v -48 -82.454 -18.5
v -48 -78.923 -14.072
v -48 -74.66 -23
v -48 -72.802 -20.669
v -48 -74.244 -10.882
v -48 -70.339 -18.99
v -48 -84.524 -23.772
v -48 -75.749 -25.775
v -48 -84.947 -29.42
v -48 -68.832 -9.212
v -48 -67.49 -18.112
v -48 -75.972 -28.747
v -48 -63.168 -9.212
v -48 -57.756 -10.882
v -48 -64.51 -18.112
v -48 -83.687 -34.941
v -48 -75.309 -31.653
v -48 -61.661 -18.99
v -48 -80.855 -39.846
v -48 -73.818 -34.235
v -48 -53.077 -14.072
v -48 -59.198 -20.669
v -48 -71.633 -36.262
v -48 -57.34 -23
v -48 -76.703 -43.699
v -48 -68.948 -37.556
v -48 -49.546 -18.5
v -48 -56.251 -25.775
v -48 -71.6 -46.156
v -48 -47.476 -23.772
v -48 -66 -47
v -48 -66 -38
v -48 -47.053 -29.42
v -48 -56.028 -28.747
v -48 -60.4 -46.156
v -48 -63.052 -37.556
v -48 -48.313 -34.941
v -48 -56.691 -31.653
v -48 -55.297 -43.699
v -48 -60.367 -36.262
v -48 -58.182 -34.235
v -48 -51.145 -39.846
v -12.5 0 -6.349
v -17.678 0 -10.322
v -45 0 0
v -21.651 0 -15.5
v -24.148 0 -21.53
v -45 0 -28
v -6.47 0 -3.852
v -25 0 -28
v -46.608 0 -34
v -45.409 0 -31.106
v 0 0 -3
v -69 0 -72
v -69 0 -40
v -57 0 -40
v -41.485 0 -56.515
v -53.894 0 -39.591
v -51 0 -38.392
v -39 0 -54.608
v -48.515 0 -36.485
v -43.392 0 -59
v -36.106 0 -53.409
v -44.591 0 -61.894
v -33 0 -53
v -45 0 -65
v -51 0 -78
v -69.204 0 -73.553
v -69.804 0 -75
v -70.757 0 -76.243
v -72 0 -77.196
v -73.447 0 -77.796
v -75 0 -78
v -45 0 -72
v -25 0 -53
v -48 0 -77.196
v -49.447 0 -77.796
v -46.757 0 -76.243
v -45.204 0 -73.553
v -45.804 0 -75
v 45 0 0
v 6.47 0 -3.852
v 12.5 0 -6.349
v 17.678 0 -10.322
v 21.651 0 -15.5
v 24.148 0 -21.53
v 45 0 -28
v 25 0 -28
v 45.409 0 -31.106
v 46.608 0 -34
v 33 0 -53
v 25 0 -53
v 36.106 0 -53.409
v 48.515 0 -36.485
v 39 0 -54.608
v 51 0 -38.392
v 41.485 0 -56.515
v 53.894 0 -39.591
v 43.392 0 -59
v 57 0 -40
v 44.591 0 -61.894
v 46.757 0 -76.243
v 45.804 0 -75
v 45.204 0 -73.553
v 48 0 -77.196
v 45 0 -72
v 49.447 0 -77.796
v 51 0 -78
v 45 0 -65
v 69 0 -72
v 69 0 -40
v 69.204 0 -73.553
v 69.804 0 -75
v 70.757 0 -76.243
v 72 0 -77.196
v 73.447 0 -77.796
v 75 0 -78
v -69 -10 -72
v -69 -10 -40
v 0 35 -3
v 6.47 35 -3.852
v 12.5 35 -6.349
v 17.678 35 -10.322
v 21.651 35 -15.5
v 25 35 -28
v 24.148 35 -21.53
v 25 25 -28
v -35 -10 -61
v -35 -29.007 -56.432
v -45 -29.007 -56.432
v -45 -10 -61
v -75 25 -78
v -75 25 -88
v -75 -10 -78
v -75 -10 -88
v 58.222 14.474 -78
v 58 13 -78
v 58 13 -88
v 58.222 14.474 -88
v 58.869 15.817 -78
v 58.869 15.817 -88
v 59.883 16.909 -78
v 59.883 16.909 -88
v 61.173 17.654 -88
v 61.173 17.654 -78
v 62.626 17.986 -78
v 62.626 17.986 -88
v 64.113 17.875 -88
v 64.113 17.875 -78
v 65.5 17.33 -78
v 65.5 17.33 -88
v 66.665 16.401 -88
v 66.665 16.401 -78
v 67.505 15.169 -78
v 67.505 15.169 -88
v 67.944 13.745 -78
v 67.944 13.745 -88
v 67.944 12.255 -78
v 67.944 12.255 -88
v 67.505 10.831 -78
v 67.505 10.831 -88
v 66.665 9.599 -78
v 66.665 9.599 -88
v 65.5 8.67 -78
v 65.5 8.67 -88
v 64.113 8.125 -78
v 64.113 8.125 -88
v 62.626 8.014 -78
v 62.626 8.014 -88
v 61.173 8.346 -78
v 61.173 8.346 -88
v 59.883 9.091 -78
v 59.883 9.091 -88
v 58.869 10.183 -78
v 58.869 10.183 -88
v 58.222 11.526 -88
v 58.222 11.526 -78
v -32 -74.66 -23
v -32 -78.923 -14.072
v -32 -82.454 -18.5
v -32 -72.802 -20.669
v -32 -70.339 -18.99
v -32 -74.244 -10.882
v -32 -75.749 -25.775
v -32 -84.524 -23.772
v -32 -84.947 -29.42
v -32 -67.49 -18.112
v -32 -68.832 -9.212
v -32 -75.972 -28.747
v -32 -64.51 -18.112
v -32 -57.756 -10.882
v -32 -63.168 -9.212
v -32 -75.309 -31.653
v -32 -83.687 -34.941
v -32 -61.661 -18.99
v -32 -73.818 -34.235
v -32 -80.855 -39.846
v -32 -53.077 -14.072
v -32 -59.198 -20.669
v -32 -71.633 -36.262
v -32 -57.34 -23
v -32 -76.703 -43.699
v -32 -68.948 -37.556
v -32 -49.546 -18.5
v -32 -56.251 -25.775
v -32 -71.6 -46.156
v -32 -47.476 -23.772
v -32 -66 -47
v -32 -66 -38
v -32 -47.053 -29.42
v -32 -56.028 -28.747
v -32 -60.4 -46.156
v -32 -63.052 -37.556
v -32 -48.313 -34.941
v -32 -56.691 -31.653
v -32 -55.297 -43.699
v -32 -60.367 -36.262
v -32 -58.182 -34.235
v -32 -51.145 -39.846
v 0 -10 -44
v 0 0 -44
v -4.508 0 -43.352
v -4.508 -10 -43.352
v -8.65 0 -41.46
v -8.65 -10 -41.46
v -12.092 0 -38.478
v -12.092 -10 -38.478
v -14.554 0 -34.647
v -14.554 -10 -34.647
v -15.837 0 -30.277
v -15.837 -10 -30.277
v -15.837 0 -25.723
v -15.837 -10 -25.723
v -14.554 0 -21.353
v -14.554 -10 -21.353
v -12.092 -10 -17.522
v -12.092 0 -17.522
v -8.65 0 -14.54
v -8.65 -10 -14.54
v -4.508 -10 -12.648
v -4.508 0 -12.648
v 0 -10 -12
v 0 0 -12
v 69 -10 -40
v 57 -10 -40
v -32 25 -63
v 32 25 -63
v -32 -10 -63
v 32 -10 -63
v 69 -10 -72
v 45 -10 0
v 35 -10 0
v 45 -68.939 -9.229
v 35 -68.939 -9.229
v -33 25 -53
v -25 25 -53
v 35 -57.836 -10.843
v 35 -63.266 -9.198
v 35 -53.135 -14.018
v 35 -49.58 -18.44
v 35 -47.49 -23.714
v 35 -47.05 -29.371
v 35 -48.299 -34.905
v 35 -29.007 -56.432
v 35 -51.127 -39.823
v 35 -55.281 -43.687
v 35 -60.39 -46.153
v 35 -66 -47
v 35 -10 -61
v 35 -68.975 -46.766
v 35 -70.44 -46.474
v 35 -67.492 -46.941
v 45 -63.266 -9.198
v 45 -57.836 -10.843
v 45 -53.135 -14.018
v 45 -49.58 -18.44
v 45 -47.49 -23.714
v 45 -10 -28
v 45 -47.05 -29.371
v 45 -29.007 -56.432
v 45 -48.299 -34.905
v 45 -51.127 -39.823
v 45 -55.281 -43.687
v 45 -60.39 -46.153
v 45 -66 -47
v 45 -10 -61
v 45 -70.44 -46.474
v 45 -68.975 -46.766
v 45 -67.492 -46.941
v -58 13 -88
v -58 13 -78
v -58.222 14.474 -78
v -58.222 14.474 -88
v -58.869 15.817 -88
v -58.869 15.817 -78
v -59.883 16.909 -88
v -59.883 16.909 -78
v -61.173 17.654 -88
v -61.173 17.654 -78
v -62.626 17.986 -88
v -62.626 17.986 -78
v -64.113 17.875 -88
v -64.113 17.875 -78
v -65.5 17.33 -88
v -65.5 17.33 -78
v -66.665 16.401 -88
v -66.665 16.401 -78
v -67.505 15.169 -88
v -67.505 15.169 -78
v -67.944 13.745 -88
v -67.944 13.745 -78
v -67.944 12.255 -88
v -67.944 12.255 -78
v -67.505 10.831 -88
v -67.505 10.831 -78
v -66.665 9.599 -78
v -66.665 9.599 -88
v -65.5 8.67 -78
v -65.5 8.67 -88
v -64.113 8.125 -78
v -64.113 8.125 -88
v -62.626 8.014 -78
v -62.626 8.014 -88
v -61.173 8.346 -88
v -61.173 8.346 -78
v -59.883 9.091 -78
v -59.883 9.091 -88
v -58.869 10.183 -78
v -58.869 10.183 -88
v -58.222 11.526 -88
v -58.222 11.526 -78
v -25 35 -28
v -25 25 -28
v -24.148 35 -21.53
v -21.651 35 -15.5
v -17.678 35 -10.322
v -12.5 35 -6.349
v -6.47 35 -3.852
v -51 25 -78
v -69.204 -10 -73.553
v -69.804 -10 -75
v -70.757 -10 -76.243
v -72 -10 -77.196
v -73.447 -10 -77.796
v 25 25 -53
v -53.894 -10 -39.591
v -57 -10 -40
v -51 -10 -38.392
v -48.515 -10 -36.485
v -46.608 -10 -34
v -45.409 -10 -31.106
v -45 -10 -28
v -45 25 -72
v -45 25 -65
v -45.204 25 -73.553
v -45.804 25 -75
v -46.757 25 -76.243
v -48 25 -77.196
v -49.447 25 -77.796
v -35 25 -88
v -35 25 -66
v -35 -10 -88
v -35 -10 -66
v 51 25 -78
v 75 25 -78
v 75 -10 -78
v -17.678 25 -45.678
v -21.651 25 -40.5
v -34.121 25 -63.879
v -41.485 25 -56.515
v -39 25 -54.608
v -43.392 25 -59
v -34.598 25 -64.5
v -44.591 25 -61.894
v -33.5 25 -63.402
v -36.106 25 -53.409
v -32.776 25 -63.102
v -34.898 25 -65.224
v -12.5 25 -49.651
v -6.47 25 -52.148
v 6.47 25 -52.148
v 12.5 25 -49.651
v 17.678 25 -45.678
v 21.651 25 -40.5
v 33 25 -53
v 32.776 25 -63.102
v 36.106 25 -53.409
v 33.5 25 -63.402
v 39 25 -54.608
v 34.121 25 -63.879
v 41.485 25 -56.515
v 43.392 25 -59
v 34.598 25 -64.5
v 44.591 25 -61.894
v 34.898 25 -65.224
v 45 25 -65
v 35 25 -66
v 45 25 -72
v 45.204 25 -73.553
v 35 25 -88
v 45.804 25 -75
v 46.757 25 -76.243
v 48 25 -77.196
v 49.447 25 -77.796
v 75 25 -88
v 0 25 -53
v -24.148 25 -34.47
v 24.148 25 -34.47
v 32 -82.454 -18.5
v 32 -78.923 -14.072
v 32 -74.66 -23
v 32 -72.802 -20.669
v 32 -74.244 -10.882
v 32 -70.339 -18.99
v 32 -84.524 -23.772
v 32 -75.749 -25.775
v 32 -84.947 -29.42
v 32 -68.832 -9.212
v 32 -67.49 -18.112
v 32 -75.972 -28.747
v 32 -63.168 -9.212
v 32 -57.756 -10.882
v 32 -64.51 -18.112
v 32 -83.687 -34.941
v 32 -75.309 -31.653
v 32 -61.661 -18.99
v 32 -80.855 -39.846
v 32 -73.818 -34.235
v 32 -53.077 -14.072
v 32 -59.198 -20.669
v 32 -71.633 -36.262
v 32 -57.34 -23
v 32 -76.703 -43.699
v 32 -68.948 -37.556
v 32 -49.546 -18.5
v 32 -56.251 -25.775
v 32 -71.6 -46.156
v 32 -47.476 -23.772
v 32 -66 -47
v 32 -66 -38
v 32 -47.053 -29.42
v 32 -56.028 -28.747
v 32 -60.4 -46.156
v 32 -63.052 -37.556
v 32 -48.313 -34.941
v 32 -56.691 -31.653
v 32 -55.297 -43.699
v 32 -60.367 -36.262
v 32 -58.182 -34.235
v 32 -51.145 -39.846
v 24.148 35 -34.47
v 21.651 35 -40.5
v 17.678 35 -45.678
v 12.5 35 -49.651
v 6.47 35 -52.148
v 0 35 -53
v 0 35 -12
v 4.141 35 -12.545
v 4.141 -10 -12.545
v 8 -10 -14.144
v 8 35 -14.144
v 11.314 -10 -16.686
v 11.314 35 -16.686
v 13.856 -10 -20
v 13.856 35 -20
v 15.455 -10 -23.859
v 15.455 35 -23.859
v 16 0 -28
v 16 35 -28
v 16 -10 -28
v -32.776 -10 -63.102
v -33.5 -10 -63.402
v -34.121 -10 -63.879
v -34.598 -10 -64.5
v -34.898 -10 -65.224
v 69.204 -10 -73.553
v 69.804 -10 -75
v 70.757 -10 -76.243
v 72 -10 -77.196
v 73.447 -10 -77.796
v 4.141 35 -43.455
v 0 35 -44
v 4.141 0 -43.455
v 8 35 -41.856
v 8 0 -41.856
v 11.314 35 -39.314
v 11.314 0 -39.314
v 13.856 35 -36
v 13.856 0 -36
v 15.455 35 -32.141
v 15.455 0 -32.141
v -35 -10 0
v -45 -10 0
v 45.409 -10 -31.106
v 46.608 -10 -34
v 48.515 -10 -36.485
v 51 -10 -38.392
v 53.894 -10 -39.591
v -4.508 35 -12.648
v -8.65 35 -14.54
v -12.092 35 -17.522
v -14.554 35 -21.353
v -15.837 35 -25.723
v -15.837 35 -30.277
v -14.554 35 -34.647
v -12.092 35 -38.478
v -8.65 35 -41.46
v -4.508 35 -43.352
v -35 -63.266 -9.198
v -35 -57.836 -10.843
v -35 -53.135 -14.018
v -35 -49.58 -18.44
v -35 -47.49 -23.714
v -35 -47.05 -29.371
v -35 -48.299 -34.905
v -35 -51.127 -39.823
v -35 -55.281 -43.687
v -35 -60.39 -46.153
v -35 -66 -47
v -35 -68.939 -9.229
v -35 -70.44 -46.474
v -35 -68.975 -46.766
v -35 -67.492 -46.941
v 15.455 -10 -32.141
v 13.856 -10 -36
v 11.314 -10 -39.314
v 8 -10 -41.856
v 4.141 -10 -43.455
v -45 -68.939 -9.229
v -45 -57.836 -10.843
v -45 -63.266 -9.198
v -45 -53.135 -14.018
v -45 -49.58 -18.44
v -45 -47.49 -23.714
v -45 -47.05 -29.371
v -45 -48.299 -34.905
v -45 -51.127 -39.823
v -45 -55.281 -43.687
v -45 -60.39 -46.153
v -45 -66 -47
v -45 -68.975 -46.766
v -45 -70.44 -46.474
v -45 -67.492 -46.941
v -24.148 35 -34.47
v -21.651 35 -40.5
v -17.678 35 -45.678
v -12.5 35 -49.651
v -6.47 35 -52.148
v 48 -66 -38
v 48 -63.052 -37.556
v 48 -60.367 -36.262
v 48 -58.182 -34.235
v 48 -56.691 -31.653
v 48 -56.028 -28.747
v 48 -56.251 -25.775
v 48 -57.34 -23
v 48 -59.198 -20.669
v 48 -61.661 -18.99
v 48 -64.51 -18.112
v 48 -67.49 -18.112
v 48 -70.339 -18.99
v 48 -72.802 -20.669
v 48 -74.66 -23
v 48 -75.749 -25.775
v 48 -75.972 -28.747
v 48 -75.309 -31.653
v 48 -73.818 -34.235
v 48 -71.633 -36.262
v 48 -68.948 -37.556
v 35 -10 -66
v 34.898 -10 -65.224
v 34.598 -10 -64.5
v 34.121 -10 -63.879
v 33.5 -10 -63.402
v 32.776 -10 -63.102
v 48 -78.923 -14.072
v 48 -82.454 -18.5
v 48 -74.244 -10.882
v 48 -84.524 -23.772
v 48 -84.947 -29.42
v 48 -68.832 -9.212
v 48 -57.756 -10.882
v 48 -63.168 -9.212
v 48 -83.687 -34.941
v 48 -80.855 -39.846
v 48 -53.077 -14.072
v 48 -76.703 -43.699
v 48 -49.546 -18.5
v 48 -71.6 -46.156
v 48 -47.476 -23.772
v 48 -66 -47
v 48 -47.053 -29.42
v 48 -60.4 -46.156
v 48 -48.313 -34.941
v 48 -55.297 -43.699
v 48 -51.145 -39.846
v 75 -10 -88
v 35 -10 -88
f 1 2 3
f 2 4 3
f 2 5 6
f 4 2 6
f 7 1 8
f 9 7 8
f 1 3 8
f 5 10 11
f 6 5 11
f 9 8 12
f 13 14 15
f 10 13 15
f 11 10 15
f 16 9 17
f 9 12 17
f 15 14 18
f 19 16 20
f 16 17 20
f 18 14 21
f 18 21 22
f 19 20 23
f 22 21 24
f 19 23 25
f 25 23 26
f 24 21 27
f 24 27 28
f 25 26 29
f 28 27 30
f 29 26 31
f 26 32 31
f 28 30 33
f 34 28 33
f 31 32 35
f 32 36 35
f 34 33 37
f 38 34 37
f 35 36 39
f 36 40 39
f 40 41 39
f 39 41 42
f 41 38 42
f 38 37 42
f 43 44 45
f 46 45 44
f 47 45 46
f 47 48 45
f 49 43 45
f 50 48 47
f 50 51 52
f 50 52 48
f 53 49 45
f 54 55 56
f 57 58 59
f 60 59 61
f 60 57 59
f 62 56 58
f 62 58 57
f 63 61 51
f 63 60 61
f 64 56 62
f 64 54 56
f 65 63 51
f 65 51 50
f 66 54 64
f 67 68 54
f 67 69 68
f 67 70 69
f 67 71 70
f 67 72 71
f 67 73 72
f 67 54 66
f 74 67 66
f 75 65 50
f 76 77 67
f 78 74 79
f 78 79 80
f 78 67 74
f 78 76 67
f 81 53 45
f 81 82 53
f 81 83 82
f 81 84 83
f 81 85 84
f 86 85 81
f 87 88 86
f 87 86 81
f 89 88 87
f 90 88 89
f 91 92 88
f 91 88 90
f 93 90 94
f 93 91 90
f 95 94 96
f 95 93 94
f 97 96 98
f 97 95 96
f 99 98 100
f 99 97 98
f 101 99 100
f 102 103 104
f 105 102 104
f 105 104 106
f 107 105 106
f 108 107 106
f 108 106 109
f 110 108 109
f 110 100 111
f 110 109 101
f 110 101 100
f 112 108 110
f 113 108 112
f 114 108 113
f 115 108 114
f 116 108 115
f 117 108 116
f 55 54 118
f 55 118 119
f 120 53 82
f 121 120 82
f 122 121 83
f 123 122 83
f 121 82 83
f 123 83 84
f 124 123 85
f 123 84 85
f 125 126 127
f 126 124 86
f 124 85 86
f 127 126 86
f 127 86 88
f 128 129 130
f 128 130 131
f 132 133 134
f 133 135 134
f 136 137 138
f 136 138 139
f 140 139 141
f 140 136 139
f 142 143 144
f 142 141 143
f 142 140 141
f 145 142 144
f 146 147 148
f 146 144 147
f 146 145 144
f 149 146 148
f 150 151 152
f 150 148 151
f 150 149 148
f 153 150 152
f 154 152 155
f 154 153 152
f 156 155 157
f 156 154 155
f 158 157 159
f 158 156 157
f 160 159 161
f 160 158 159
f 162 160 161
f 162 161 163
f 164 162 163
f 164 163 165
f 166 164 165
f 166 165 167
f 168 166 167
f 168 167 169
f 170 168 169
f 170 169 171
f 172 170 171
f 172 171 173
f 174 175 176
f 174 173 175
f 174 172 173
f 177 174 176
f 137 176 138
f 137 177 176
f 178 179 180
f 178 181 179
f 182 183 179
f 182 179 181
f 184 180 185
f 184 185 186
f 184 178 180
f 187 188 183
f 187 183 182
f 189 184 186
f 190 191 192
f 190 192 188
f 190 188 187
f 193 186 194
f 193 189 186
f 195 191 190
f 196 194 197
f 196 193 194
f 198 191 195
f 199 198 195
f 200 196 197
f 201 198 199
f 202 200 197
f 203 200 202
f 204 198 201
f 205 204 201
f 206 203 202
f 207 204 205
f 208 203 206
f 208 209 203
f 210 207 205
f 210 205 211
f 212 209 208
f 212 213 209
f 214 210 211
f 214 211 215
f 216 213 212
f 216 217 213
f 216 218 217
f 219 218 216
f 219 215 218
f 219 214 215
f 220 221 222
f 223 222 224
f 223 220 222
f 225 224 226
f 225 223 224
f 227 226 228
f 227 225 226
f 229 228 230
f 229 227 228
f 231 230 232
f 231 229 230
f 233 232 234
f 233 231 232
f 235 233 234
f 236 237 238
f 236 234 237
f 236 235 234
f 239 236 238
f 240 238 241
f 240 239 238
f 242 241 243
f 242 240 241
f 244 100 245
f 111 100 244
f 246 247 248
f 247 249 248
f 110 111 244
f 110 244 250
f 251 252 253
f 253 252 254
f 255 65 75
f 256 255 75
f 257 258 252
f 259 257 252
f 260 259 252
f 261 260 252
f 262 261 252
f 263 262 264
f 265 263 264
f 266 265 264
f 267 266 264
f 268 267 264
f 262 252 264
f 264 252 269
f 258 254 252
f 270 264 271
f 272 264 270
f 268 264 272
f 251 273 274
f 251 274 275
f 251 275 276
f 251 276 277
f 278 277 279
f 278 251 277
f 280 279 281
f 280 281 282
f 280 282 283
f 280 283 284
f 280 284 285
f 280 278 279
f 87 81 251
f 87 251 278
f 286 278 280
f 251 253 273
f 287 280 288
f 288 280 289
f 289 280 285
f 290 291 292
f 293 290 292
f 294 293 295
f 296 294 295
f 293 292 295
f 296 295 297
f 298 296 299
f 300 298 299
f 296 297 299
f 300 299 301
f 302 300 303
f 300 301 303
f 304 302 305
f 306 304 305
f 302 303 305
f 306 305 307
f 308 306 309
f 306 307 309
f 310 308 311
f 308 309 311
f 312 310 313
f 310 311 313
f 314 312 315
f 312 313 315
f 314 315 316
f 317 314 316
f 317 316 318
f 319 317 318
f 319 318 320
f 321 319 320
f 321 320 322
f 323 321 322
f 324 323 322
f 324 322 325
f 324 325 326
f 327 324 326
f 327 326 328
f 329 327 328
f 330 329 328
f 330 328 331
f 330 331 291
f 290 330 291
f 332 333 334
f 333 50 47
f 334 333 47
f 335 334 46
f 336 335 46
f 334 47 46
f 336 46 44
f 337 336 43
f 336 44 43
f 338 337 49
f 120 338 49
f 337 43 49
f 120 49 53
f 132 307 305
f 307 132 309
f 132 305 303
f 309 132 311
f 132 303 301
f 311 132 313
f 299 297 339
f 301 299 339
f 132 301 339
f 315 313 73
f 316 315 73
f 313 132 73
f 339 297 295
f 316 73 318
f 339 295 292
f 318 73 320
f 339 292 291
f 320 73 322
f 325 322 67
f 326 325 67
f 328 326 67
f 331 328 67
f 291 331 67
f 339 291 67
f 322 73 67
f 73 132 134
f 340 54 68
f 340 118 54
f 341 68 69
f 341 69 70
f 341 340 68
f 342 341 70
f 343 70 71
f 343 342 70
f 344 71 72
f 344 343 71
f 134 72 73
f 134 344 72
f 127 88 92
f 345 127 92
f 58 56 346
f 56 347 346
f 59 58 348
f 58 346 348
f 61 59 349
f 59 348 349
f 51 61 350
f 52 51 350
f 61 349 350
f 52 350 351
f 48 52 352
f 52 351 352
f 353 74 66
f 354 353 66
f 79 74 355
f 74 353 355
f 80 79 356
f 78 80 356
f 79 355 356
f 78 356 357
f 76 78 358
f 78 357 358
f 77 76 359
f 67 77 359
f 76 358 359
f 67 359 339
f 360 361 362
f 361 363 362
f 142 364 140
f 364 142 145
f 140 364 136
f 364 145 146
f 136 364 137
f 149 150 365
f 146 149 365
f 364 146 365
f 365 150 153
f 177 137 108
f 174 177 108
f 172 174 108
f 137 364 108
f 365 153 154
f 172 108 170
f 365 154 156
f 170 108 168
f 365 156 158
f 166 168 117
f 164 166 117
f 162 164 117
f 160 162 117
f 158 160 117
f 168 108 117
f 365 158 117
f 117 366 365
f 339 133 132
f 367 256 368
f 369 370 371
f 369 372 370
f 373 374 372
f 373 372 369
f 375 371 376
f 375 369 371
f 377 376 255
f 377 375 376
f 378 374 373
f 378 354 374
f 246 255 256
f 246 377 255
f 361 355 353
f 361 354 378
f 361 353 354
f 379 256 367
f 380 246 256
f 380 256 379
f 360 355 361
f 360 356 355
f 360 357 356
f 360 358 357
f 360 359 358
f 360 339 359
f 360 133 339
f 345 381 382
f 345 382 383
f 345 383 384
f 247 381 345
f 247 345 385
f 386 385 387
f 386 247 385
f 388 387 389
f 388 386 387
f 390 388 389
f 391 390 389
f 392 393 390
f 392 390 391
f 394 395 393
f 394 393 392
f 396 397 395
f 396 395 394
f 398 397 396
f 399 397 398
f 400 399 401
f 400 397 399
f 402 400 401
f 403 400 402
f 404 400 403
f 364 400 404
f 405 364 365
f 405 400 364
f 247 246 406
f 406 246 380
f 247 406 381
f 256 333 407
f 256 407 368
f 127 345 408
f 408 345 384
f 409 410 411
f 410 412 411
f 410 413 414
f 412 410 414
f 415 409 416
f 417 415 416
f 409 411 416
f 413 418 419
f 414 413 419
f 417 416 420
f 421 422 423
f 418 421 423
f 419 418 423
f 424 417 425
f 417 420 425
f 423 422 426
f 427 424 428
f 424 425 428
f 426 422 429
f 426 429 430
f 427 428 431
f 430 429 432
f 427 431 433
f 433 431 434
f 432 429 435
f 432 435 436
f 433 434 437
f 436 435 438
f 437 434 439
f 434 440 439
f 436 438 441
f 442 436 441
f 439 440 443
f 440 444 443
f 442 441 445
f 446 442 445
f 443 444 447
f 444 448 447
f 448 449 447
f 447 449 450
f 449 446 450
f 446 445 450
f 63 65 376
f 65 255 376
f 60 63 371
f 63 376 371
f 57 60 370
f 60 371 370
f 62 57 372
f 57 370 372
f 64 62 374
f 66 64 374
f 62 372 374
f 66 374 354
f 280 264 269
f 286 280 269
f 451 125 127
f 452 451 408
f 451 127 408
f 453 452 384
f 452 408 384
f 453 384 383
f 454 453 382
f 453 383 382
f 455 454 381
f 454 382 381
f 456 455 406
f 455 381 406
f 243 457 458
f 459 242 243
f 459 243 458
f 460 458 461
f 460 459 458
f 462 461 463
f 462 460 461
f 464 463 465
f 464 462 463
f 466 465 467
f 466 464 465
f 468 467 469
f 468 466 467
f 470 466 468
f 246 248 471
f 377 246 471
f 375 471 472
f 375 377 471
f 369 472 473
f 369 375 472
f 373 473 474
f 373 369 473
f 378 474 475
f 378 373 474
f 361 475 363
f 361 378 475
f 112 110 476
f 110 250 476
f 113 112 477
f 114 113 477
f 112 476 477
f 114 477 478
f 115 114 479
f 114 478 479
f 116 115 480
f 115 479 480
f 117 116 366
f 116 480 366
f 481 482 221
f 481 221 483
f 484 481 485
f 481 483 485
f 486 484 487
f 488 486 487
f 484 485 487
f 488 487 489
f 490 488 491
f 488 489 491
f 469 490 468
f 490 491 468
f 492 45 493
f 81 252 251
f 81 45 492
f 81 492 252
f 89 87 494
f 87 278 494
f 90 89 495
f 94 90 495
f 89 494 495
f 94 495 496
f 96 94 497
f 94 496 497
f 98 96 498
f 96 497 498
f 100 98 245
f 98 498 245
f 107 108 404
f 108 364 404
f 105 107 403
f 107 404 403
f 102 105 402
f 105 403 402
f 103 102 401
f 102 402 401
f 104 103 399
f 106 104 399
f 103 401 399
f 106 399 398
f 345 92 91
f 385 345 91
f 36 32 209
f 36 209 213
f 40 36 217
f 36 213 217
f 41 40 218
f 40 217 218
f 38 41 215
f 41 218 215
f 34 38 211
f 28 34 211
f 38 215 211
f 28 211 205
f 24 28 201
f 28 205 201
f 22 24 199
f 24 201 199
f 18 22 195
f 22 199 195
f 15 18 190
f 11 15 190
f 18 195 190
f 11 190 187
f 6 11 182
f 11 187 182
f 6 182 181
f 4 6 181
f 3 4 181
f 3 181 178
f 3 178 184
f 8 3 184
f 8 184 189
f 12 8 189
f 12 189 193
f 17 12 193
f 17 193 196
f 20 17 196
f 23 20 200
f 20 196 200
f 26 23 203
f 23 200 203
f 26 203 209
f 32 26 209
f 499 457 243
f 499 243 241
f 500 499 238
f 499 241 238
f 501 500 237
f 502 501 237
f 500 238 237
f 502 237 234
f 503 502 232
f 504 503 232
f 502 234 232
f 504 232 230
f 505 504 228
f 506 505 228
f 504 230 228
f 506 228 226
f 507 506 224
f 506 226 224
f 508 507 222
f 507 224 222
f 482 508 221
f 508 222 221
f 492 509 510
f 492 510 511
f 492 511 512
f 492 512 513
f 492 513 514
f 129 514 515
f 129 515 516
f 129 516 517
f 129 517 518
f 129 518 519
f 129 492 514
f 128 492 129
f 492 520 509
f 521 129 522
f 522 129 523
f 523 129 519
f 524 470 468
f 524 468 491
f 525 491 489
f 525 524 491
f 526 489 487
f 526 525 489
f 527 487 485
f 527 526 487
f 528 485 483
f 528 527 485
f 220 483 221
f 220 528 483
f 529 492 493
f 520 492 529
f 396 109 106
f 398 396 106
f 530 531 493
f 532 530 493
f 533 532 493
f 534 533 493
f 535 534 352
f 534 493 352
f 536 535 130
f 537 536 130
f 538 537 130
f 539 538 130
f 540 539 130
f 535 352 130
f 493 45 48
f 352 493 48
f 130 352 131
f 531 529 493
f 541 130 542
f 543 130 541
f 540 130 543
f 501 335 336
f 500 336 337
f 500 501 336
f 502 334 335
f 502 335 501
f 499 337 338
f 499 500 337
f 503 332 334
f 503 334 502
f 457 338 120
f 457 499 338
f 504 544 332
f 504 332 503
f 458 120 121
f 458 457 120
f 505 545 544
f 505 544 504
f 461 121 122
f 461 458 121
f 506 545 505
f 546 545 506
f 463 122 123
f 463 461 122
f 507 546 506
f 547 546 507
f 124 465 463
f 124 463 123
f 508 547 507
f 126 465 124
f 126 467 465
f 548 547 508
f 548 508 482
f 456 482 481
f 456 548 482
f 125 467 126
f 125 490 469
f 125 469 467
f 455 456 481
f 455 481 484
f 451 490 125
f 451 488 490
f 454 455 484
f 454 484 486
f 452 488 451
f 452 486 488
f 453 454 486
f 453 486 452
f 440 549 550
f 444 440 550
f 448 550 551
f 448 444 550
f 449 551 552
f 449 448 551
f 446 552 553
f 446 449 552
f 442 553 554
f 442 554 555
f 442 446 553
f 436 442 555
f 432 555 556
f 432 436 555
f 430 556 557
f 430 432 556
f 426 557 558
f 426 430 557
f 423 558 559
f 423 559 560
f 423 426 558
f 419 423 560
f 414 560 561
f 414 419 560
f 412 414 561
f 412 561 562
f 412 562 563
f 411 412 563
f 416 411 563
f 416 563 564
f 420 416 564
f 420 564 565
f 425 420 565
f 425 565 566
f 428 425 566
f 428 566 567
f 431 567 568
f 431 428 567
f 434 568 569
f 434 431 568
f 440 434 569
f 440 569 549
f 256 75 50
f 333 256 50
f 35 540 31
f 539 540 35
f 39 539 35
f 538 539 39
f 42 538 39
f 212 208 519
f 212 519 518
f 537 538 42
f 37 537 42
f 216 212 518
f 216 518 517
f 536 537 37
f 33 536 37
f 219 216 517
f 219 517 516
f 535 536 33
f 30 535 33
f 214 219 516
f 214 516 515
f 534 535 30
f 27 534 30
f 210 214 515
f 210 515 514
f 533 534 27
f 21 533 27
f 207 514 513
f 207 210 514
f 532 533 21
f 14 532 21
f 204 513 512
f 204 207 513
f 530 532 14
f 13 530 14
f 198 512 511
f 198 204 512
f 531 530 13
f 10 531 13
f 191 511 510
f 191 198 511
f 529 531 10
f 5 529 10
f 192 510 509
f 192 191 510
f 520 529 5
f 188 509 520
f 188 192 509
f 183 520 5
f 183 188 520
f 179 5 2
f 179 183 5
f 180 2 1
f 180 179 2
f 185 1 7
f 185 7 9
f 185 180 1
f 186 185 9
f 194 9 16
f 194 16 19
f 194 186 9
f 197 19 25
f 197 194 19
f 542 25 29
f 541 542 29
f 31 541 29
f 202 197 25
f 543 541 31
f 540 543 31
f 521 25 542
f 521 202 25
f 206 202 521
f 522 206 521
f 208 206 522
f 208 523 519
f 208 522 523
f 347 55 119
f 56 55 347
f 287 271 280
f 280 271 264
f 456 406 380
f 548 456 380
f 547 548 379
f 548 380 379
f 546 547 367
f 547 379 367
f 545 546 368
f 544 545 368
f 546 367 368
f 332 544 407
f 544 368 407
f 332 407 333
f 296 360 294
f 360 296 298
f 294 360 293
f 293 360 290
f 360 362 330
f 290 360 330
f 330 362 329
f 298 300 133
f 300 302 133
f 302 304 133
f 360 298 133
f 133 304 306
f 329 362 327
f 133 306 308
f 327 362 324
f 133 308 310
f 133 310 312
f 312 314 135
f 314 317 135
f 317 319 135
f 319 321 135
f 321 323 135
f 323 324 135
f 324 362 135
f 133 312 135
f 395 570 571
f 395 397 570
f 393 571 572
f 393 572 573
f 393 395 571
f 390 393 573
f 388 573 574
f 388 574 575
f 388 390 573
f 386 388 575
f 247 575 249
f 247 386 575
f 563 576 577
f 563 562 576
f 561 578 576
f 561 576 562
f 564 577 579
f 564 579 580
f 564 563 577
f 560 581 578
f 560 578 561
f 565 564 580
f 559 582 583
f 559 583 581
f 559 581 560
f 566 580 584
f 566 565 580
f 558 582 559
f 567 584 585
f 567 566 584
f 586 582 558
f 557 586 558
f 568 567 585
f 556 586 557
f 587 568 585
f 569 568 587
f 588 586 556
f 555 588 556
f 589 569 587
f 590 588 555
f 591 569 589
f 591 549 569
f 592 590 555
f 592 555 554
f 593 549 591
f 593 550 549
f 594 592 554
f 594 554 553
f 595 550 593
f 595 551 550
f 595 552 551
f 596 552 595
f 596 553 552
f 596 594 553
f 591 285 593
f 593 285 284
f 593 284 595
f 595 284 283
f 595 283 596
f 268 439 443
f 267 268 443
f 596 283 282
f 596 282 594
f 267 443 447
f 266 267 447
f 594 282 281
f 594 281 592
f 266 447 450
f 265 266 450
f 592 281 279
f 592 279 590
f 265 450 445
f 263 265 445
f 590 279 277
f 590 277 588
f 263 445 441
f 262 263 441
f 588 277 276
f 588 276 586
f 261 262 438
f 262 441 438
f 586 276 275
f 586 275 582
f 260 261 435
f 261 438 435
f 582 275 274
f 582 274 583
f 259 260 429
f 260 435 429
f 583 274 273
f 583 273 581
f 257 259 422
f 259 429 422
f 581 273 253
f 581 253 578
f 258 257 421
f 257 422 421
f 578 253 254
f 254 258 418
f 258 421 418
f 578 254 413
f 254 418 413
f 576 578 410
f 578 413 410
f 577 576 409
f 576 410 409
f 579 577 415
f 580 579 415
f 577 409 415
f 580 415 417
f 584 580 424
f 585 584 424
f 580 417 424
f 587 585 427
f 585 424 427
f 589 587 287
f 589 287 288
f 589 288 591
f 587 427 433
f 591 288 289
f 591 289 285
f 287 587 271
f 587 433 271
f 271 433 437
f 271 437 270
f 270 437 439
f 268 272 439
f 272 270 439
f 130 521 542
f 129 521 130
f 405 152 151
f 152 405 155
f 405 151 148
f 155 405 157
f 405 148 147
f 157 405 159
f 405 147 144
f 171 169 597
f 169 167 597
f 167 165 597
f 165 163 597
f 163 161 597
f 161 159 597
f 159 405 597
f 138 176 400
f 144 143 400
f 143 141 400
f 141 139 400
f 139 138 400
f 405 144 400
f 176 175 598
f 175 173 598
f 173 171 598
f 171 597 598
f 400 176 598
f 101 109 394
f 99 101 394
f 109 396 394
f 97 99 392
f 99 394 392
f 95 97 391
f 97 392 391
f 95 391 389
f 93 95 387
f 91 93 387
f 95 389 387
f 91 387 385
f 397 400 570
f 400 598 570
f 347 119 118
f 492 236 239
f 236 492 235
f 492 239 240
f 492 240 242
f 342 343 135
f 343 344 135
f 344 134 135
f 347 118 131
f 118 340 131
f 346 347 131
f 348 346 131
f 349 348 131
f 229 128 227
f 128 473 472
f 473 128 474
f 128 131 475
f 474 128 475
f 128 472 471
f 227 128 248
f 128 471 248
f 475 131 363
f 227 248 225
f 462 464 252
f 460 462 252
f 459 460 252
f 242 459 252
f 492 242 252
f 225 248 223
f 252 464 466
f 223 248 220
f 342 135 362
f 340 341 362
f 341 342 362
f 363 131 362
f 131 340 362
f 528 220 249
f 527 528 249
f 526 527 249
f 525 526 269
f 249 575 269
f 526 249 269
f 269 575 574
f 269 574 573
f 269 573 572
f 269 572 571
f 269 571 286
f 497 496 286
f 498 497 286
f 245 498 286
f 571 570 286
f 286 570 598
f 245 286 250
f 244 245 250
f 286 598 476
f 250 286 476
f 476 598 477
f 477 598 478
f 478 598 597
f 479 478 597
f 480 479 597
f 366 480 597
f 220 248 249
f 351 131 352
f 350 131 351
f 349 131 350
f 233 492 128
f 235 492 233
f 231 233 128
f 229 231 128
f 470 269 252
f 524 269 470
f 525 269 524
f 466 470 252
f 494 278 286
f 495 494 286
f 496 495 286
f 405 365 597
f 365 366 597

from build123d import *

# Parameters (mm, degrees)
EXTRUDE_1_DEPTH     = 10
FILLET_1_R          = 12
FILLET_2_R          = 6
EXTRUDE_2_DEPTH     = 25
EXTRUDE_3_DEPTH     = 35
SKETCH_2_4_W        = 70
SKETCH_2_4_H        = 25
CUT_EXTRUDE_1_DEPTH = 35
FILLET_3_R          = 6
FILLET_4_R          = 12
FILLET_5_R          = 3
CUT_EXTRUDE_START   = -35
CUT_EXTRUDE_2_DEPTH = 35
EXTRUDE_START       = 35
EXTRUDE_4_DEPTH     = 10
EXTRUDE_START_2     = 32
SKETCH_6_4_R        = 19
SKETCH_6_4_R_2      = 10
EXTRUDE_5_DEPTH     = 16
SKETCH_7_R          = 5
CUT_EXTRUDE_3_DEPTH = 144.506097431


with BuildPart() as part:
    # 草图1 → 凸台-拉伸1 (new body)
    with BuildSketch(Plane(origin=(0, 0, 0), x_dir=(1, 0, 0), z_dir=(0, 1, 0))):
        Polygon((45, 0), (45, 40), (69, 40), (69, 78), (75, 78), (75, 88), (-75, 88), (-75, 78), (-69, 78), (-69, 40), (-45, 40), (-45, 0), align=None)
    extrude(amount=-EXTRUDE_1_DEPTH)

    # 圆角1
    fillet_1_edges = [part.edges().sort_by_distance(p)[0] for p in [
        (-45, -5, -40),
        (45, -5, -40),
    ]]
    fillet(fillet_1_edges, radius=FILLET_1_R)

    # 圆角2
    fillet_2_edges = [part.edges().sort_by_distance(p)[0] for p in [
        (69, -5, -78),
        (-69, -5, -78),
    ]]
    fillet(fillet_2_edges, radius=FILLET_2_R - 0.0001)  # a hair under: the kernel refuses the full size

    # 草图2 → 凸台-拉伸2 (add)
    with BuildSketch(Plane(origin=(0, 0, 0), x_dir=(1, 0, 0), z_dir=(0, 1, 0))):
        with BuildLine():
            Line((-25, 53), (-25, 28))
            ThreePointArc((-25, 28), (-17.67766953, 45.67766953), (0, 53))
            Line((0, 53), (0, 63))
            Line((0, 63), (-35, 63))
            Line((-35, 63), (-35, 88))
            Line((-35, 88), (-75, 88))
            Line((-75, 88), (-75, 78))
            Line((-75, 78), (-45, 78))
            Line((-45, 78), (-45, 53))
            Line((-45, 53), (-25, 53))
        make_face()
        with BuildLine():
            ThreePointArc((0, 53), (17.67766953, 45.67766953), (25, 28))
            Line((25, 28), (25, 53))
            Line((25, 53), (45, 53))
            Line((45, 53), (45, 78))
            Line((45, 78), (75, 78))
            Line((75, 78), (75, 88))
            Line((75, 88), (35, 88))
            Line((35, 88), (35, 63))
            Line((35, 63), (0, 63))
            Line((0, 63), (0, 53))
        make_face()
    extrude(amount=EXTRUDE_2_DEPTH)

    # 草图2<3> → 凸台-拉伸3 (add)
    with BuildSketch(Plane(origin=(0, 0, 0), x_dir=(1, 0, 0), z_dir=(0, 1, 0))):
        with BuildLine():
            ThreePointArc((-25, 28), (-17.67766953, 10.32233047), (0, 3))
            Line((0, 3), (0, 12))
            ThreePointArc((0, 12), (-16, 28), (0, 44))
            Line((0, 44), (0, 53))
            ThreePointArc((0, 53), (-17.67766953, 45.67766953), (-25, 28))
        make_face()
        with BuildLine():
            Line((0, 12), (0, 3))
            ThreePointArc((0, 3), (17.67766953, 10.32233047), (25, 28))
            ThreePointArc((25, 28), (17.67766953, 45.67766953), (0, 53))
            Line((0, 53), (0, 44))
            ThreePointArc((0, 44), (11.313708499, 39.313708499), (16, 28))
            ThreePointArc((16, 28), (11.313708499, 16.686291501), (0, 12))
        make_face()
    extrude(amount=EXTRUDE_3_DEPTH)

    # 草图2<4> → 切除-拉伸1 (cut)
    with BuildSketch(Plane(origin=(0, 0, 0), x_dir=(1, 0, 0), z_dir=(0, 1, 0))):
        with Locations((0, 75.5)):
            Rectangle(SKETCH_2_4_W, SKETCH_2_4_H)
    extrude(amount=-CUT_EXTRUDE_1_DEPTH, mode=Mode.SUBTRACT)

    # 圆角3
    fillet_3_edges = [part.edges().sort_by_distance(p)[0] for p in [
        (45, 12.5, -78),
        (-45, 12.5, -78),
    ]]
    fillet(fillet_3_edges, radius=FILLET_3_R)

    # 圆角4
    fillet_4_edges = [part.edges().sort_by_distance(p)[0] for p in [
        (45, 12.5, -53),
        (-45, 12.5, -53),
    ]]
    fillet(fillet_4_edges, radius=FILLET_4_R)

    # 圆角5
    fillet_5_edges = [part.edges().sort_by_distance(p)[0] for p in [
        (35, 7.5, -63),
        (-35, 7.5, -63),
    ]]
    fillet(fillet_5_edges, radius=FILLET_5_R)

    # 草图2<5> → 切除-拉伸2 (cut)
    with BuildSketch(Plane(origin=(0, 0, 0), x_dir=(1, 0, 0), z_dir=(0, 1, 0)).offset(CUT_EXTRUDE_START)):
        with BuildLine():
            ThreePointArc((0, 44), (-16, 28), (0, 12))
            Line((0, 12), (0, 44))
        make_face()
        with BuildLine():
            Line((0, 44), (0, 12))
            ThreePointArc((0, 12), (11.313708499, 16.686291501), (16, 28))
            ThreePointArc((16, 28), (11.313708499, 39.313708499), (0, 44))
        make_face()
    extrude(amount=CUT_EXTRUDE_2_DEPTH, mode=Mode.SUBTRACT)

    # 草图6 → 凸台-拉伸4 (add)
    with BuildSketch(Plane(origin=(0, 0, 0), x_dir=(0, 0, -1), z_dir=(1, 0, 0)).offset(EXTRUDE_START)):
        with BuildLine():
            Line((0, -10), (9.228717941, -68.939212458))
            ThreePointArc((9.228717941, -68.939212458), (26.525951004, -47.057265785), (47, -66))
            ThreePointArc((47, -66), (46.868026287, -68.235527685), (46.473938523, -70.439999487))
            Line((46.473938523, -70.439999487), (56.431805566, -29.007331733))
            Line((56.431805566, -29.007331733), (61, -10))
            Line((61, -10), (0, -10))
        make_face()
    extrude_4 = extrude(amount=EXTRUDE_4_DEPTH)

    # 草图6<4> → 凸台-拉伸5 (add)
    with BuildSketch(Plane(origin=(0, 0, 0), x_dir=(0, 0, -1), z_dir=(1, 0, 0)).offset(EXTRUDE_START_2)):
        with Locations((28, -66)):
            Circle(SKETCH_6_4_R)
        with Locations((28, -66)):
            Circle(SKETCH_6_4_R_2, mode=Mode.SUBTRACT)
    extrude_5 = extrude(amount=EXTRUDE_5_DEPTH)

    # 镜向1: 凸台-拉伸4, 凸台-拉伸5 across plane
    add(extrude_4.mirror(Plane(origin=(0, 0, 0), x_dir=(0, 0, 1), z_dir=(1, 0, 0))))
    add(extrude_5.mirror(Plane(origin=(0, 0, 0), x_dir=(0, 0, 1), z_dir=(1, 0, 0))))

    # 草图7 → 切除-拉伸3 (cut, through all)
    with BuildSketch(Plane.XY):
        with Locations((-63, 13)):
            Circle(SKETCH_7_R)
    cut_extrude_3 = extrude(amount=-CUT_EXTRUDE_3_DEPTH, mode=Mode.SUBTRACT)

    # 镜向2: 切除-拉伸3 across plane
    add(cut_extrude_3.mirror(Plane(origin=(0, 0, 0), x_dir=(0, 0, 1), z_dir=(1, 0, 0))), mode=Mode.SUBTRACT)


solid = part.part
